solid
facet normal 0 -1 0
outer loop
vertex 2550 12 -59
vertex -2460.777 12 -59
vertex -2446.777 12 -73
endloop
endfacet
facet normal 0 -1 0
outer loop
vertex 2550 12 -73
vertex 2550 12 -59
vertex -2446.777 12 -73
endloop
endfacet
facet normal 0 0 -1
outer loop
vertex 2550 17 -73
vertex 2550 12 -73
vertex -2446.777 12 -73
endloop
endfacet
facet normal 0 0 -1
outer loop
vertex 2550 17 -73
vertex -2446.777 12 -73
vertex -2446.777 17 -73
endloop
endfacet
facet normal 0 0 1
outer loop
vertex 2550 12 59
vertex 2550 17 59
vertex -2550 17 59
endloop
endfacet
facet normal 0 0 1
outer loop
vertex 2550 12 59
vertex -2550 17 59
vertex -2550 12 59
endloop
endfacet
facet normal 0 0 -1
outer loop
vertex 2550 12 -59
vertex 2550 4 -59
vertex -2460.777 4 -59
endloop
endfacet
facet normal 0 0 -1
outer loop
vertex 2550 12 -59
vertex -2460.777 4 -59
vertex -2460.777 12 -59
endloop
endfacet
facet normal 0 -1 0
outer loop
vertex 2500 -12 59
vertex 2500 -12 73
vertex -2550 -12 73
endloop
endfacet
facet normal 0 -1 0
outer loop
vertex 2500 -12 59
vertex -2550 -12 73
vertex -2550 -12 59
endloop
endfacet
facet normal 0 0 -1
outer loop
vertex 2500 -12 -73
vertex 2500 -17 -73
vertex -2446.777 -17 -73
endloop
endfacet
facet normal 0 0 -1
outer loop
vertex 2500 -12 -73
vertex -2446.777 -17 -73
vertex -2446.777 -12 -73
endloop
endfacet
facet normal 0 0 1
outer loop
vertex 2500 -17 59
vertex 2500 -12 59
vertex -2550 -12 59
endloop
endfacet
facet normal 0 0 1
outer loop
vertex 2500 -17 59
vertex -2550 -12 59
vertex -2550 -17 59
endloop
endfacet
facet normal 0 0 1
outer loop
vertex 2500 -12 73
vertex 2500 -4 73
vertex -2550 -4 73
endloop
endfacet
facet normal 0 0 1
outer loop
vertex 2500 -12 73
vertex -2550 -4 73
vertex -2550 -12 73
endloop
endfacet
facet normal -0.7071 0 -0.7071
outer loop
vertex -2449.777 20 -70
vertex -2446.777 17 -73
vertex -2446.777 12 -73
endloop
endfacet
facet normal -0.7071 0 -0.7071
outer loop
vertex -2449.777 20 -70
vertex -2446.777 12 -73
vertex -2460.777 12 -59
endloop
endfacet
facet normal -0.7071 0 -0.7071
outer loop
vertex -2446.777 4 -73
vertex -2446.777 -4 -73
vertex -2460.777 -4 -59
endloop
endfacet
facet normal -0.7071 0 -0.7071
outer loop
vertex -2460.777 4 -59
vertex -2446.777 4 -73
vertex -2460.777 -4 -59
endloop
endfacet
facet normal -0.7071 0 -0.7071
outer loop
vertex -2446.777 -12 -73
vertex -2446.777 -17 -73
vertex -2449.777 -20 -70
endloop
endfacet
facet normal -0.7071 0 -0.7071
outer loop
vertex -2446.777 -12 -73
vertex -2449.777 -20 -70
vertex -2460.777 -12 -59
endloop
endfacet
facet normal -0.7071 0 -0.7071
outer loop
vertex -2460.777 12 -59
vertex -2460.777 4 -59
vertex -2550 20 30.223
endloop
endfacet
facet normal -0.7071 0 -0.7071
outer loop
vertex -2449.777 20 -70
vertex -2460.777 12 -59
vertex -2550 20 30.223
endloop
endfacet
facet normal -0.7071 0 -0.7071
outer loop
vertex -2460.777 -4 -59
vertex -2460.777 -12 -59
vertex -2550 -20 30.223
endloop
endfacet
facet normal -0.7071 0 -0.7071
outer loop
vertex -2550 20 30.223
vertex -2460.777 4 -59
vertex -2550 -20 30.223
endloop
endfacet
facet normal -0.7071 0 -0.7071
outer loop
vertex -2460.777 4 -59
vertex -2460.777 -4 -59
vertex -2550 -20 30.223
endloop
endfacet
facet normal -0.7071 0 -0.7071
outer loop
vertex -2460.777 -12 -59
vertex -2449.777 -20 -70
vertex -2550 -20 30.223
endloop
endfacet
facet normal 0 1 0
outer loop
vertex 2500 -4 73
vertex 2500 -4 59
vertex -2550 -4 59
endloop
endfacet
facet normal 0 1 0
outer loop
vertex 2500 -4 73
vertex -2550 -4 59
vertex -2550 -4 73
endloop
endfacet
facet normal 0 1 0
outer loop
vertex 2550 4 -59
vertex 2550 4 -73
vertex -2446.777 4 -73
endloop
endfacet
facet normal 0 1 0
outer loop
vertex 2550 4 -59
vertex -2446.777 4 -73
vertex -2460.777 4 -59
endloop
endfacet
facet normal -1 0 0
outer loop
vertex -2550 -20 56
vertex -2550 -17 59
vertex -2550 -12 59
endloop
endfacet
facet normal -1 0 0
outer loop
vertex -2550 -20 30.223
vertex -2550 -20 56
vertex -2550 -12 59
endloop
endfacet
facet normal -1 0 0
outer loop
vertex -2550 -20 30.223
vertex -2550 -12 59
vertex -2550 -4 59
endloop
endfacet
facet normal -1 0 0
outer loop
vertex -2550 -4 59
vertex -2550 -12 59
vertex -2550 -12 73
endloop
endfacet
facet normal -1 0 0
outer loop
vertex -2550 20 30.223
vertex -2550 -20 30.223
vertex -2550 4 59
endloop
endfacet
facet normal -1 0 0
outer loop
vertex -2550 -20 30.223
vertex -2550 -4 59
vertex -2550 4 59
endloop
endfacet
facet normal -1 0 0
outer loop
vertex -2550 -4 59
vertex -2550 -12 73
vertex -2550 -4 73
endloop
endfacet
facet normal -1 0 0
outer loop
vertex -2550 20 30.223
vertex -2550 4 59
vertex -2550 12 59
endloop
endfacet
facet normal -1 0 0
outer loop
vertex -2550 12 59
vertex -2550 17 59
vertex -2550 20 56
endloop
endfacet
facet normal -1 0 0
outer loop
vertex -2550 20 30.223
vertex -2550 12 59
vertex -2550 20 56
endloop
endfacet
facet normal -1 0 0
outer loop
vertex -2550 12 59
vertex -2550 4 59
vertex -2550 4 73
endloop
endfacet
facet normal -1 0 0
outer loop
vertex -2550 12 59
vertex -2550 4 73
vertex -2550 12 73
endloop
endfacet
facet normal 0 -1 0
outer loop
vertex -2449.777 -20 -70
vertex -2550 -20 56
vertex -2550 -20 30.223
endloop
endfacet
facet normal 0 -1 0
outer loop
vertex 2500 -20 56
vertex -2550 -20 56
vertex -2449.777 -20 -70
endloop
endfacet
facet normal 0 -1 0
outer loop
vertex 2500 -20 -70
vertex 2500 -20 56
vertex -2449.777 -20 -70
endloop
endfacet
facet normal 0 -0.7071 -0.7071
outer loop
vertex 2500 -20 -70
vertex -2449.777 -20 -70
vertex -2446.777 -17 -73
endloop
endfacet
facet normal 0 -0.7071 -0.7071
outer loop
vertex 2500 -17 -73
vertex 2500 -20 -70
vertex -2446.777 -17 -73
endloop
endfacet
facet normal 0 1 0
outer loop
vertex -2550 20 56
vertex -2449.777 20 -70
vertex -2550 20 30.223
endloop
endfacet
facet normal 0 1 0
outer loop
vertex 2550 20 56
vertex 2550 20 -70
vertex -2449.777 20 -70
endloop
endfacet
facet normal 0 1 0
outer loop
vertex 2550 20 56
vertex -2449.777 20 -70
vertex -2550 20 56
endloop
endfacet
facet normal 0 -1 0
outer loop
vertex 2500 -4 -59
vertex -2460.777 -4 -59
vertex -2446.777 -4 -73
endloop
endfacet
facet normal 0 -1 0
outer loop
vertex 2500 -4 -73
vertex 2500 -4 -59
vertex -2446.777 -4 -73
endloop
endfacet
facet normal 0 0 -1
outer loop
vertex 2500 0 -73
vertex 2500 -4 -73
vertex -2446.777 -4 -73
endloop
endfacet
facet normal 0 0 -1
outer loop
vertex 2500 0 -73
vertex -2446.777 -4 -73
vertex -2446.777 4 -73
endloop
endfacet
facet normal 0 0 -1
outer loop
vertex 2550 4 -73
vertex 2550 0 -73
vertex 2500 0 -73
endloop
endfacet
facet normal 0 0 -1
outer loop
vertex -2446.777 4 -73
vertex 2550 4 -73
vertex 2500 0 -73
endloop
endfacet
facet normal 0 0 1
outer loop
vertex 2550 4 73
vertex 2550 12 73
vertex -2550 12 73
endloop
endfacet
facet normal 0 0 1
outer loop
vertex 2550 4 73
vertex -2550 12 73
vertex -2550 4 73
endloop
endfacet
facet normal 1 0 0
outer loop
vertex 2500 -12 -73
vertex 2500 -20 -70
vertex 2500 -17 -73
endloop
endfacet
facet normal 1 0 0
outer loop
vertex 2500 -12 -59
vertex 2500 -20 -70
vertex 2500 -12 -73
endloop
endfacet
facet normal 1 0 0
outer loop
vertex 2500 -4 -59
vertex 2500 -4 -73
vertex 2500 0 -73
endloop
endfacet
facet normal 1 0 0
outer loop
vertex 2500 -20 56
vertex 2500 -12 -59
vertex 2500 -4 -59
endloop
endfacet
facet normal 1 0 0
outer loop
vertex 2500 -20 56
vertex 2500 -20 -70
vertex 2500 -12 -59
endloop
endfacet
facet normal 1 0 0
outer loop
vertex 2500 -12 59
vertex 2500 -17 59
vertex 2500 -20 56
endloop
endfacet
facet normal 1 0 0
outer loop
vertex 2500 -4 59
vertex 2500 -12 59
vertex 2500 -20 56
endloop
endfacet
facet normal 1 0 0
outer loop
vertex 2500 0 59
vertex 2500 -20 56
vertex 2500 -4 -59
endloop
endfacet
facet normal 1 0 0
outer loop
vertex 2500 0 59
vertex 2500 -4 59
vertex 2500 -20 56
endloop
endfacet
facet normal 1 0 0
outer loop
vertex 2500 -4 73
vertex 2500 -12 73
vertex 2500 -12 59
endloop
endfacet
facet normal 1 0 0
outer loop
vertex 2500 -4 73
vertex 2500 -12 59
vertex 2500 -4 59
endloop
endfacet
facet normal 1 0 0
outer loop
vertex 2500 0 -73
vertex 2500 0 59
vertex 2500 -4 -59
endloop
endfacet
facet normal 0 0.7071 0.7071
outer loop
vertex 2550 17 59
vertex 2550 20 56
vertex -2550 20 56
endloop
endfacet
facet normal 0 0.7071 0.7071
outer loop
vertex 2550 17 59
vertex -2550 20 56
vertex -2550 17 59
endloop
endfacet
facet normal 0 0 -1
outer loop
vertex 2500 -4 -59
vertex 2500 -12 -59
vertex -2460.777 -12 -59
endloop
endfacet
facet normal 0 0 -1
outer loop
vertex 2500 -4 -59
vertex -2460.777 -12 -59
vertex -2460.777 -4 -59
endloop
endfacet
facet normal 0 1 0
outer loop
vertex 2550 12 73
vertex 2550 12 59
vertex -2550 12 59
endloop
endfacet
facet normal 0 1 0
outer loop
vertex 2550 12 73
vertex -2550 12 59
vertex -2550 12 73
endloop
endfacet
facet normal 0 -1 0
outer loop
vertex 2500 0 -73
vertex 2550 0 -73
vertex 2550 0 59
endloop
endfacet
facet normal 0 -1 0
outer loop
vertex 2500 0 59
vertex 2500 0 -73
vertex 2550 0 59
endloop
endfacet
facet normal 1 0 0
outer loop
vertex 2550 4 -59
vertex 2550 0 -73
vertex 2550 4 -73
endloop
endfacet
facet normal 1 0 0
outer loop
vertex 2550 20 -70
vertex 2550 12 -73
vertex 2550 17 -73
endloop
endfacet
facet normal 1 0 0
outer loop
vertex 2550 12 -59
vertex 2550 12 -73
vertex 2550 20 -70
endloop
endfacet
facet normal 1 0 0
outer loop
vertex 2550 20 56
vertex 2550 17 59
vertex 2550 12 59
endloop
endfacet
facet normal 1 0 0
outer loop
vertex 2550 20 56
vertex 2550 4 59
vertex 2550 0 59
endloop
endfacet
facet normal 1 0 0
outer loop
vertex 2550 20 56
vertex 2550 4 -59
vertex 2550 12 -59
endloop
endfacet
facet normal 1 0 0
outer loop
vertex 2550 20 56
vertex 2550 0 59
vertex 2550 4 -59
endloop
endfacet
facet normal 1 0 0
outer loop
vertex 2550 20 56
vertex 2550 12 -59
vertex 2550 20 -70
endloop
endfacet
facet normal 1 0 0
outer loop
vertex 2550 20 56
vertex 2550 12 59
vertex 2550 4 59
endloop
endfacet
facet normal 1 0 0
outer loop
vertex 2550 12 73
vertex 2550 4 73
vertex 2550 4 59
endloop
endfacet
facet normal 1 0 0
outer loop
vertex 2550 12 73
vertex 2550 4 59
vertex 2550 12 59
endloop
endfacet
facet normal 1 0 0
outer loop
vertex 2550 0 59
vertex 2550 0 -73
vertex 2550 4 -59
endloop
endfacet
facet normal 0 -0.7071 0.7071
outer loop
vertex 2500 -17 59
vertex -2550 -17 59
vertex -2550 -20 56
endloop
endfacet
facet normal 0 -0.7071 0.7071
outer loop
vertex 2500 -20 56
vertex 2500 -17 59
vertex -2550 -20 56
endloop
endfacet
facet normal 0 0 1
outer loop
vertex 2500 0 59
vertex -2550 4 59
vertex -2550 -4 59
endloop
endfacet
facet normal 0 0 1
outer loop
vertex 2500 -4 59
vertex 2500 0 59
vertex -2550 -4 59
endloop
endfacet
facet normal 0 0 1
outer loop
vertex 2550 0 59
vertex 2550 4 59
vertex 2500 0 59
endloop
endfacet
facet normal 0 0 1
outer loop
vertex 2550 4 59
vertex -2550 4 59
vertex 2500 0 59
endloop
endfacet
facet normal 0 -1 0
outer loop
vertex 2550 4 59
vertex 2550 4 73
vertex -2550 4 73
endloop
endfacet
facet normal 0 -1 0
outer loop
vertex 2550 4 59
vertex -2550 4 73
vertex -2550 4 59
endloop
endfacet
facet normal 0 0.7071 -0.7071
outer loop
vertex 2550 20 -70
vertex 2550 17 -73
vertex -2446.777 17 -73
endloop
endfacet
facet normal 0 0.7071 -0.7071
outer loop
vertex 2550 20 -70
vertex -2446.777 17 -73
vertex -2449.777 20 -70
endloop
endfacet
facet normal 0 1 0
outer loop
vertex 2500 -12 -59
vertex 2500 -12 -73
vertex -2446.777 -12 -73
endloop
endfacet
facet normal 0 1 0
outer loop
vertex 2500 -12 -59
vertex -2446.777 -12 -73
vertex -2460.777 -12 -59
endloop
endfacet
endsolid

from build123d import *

# Parameters (mm, degrees)
F1_DEPTH = 2550
F3_DEPTH = 25
F5_DEPTH = 50


with BuildPart() as f1:
    # F0 (on Right) → F1 (new body, symmetric)
    with BuildSketch(Plane.YZ):
        Polygon((20, -70), (20, 56), (17, 59), (12, 59), (12, 73), (4, 73), (4, 59), (-4, 59), (-4, 73), (-12, 73), (-12, 59), (-17, 59), (-20, 56), (-20, -70), (-17, -73), (-12, -73), (-12, -59), (-4, -59), (-4, -73), (4, -73), (4, -59), (12, -59), (12, -73), (17, -73), align=None)
    extrude(amount=F1_DEPTH, both=True)

    # F2 (on Front) → F3 (cut, symmetric)
    with BuildSketch(Plane.XZ):
        Polygon((-2390, -129.776695), (-2566.776695, 47), (-2566.776695, -129.776695), align=None)
    extrude(amount=F3_DEPTH, both=True, mode=Mode.SUBTRACT)

    # F4 (on face) → F5 (cut)
    with BuildSketch(Plane.YZ.offset(2550)):
        Polygon((-4, -73), (0, -73), (0, 59), (-4, 59), (-4, 73), (-12, 73), (-12, 59), (-17, 59), (-20, 56), (-20, -70), (-17, -73), (-12, -73), (-12, -59), (-4, -59), align=None)
    extrude(amount=-F5_DEPTH, mode=Mode.SUBTRACT)


solid = f1.part
